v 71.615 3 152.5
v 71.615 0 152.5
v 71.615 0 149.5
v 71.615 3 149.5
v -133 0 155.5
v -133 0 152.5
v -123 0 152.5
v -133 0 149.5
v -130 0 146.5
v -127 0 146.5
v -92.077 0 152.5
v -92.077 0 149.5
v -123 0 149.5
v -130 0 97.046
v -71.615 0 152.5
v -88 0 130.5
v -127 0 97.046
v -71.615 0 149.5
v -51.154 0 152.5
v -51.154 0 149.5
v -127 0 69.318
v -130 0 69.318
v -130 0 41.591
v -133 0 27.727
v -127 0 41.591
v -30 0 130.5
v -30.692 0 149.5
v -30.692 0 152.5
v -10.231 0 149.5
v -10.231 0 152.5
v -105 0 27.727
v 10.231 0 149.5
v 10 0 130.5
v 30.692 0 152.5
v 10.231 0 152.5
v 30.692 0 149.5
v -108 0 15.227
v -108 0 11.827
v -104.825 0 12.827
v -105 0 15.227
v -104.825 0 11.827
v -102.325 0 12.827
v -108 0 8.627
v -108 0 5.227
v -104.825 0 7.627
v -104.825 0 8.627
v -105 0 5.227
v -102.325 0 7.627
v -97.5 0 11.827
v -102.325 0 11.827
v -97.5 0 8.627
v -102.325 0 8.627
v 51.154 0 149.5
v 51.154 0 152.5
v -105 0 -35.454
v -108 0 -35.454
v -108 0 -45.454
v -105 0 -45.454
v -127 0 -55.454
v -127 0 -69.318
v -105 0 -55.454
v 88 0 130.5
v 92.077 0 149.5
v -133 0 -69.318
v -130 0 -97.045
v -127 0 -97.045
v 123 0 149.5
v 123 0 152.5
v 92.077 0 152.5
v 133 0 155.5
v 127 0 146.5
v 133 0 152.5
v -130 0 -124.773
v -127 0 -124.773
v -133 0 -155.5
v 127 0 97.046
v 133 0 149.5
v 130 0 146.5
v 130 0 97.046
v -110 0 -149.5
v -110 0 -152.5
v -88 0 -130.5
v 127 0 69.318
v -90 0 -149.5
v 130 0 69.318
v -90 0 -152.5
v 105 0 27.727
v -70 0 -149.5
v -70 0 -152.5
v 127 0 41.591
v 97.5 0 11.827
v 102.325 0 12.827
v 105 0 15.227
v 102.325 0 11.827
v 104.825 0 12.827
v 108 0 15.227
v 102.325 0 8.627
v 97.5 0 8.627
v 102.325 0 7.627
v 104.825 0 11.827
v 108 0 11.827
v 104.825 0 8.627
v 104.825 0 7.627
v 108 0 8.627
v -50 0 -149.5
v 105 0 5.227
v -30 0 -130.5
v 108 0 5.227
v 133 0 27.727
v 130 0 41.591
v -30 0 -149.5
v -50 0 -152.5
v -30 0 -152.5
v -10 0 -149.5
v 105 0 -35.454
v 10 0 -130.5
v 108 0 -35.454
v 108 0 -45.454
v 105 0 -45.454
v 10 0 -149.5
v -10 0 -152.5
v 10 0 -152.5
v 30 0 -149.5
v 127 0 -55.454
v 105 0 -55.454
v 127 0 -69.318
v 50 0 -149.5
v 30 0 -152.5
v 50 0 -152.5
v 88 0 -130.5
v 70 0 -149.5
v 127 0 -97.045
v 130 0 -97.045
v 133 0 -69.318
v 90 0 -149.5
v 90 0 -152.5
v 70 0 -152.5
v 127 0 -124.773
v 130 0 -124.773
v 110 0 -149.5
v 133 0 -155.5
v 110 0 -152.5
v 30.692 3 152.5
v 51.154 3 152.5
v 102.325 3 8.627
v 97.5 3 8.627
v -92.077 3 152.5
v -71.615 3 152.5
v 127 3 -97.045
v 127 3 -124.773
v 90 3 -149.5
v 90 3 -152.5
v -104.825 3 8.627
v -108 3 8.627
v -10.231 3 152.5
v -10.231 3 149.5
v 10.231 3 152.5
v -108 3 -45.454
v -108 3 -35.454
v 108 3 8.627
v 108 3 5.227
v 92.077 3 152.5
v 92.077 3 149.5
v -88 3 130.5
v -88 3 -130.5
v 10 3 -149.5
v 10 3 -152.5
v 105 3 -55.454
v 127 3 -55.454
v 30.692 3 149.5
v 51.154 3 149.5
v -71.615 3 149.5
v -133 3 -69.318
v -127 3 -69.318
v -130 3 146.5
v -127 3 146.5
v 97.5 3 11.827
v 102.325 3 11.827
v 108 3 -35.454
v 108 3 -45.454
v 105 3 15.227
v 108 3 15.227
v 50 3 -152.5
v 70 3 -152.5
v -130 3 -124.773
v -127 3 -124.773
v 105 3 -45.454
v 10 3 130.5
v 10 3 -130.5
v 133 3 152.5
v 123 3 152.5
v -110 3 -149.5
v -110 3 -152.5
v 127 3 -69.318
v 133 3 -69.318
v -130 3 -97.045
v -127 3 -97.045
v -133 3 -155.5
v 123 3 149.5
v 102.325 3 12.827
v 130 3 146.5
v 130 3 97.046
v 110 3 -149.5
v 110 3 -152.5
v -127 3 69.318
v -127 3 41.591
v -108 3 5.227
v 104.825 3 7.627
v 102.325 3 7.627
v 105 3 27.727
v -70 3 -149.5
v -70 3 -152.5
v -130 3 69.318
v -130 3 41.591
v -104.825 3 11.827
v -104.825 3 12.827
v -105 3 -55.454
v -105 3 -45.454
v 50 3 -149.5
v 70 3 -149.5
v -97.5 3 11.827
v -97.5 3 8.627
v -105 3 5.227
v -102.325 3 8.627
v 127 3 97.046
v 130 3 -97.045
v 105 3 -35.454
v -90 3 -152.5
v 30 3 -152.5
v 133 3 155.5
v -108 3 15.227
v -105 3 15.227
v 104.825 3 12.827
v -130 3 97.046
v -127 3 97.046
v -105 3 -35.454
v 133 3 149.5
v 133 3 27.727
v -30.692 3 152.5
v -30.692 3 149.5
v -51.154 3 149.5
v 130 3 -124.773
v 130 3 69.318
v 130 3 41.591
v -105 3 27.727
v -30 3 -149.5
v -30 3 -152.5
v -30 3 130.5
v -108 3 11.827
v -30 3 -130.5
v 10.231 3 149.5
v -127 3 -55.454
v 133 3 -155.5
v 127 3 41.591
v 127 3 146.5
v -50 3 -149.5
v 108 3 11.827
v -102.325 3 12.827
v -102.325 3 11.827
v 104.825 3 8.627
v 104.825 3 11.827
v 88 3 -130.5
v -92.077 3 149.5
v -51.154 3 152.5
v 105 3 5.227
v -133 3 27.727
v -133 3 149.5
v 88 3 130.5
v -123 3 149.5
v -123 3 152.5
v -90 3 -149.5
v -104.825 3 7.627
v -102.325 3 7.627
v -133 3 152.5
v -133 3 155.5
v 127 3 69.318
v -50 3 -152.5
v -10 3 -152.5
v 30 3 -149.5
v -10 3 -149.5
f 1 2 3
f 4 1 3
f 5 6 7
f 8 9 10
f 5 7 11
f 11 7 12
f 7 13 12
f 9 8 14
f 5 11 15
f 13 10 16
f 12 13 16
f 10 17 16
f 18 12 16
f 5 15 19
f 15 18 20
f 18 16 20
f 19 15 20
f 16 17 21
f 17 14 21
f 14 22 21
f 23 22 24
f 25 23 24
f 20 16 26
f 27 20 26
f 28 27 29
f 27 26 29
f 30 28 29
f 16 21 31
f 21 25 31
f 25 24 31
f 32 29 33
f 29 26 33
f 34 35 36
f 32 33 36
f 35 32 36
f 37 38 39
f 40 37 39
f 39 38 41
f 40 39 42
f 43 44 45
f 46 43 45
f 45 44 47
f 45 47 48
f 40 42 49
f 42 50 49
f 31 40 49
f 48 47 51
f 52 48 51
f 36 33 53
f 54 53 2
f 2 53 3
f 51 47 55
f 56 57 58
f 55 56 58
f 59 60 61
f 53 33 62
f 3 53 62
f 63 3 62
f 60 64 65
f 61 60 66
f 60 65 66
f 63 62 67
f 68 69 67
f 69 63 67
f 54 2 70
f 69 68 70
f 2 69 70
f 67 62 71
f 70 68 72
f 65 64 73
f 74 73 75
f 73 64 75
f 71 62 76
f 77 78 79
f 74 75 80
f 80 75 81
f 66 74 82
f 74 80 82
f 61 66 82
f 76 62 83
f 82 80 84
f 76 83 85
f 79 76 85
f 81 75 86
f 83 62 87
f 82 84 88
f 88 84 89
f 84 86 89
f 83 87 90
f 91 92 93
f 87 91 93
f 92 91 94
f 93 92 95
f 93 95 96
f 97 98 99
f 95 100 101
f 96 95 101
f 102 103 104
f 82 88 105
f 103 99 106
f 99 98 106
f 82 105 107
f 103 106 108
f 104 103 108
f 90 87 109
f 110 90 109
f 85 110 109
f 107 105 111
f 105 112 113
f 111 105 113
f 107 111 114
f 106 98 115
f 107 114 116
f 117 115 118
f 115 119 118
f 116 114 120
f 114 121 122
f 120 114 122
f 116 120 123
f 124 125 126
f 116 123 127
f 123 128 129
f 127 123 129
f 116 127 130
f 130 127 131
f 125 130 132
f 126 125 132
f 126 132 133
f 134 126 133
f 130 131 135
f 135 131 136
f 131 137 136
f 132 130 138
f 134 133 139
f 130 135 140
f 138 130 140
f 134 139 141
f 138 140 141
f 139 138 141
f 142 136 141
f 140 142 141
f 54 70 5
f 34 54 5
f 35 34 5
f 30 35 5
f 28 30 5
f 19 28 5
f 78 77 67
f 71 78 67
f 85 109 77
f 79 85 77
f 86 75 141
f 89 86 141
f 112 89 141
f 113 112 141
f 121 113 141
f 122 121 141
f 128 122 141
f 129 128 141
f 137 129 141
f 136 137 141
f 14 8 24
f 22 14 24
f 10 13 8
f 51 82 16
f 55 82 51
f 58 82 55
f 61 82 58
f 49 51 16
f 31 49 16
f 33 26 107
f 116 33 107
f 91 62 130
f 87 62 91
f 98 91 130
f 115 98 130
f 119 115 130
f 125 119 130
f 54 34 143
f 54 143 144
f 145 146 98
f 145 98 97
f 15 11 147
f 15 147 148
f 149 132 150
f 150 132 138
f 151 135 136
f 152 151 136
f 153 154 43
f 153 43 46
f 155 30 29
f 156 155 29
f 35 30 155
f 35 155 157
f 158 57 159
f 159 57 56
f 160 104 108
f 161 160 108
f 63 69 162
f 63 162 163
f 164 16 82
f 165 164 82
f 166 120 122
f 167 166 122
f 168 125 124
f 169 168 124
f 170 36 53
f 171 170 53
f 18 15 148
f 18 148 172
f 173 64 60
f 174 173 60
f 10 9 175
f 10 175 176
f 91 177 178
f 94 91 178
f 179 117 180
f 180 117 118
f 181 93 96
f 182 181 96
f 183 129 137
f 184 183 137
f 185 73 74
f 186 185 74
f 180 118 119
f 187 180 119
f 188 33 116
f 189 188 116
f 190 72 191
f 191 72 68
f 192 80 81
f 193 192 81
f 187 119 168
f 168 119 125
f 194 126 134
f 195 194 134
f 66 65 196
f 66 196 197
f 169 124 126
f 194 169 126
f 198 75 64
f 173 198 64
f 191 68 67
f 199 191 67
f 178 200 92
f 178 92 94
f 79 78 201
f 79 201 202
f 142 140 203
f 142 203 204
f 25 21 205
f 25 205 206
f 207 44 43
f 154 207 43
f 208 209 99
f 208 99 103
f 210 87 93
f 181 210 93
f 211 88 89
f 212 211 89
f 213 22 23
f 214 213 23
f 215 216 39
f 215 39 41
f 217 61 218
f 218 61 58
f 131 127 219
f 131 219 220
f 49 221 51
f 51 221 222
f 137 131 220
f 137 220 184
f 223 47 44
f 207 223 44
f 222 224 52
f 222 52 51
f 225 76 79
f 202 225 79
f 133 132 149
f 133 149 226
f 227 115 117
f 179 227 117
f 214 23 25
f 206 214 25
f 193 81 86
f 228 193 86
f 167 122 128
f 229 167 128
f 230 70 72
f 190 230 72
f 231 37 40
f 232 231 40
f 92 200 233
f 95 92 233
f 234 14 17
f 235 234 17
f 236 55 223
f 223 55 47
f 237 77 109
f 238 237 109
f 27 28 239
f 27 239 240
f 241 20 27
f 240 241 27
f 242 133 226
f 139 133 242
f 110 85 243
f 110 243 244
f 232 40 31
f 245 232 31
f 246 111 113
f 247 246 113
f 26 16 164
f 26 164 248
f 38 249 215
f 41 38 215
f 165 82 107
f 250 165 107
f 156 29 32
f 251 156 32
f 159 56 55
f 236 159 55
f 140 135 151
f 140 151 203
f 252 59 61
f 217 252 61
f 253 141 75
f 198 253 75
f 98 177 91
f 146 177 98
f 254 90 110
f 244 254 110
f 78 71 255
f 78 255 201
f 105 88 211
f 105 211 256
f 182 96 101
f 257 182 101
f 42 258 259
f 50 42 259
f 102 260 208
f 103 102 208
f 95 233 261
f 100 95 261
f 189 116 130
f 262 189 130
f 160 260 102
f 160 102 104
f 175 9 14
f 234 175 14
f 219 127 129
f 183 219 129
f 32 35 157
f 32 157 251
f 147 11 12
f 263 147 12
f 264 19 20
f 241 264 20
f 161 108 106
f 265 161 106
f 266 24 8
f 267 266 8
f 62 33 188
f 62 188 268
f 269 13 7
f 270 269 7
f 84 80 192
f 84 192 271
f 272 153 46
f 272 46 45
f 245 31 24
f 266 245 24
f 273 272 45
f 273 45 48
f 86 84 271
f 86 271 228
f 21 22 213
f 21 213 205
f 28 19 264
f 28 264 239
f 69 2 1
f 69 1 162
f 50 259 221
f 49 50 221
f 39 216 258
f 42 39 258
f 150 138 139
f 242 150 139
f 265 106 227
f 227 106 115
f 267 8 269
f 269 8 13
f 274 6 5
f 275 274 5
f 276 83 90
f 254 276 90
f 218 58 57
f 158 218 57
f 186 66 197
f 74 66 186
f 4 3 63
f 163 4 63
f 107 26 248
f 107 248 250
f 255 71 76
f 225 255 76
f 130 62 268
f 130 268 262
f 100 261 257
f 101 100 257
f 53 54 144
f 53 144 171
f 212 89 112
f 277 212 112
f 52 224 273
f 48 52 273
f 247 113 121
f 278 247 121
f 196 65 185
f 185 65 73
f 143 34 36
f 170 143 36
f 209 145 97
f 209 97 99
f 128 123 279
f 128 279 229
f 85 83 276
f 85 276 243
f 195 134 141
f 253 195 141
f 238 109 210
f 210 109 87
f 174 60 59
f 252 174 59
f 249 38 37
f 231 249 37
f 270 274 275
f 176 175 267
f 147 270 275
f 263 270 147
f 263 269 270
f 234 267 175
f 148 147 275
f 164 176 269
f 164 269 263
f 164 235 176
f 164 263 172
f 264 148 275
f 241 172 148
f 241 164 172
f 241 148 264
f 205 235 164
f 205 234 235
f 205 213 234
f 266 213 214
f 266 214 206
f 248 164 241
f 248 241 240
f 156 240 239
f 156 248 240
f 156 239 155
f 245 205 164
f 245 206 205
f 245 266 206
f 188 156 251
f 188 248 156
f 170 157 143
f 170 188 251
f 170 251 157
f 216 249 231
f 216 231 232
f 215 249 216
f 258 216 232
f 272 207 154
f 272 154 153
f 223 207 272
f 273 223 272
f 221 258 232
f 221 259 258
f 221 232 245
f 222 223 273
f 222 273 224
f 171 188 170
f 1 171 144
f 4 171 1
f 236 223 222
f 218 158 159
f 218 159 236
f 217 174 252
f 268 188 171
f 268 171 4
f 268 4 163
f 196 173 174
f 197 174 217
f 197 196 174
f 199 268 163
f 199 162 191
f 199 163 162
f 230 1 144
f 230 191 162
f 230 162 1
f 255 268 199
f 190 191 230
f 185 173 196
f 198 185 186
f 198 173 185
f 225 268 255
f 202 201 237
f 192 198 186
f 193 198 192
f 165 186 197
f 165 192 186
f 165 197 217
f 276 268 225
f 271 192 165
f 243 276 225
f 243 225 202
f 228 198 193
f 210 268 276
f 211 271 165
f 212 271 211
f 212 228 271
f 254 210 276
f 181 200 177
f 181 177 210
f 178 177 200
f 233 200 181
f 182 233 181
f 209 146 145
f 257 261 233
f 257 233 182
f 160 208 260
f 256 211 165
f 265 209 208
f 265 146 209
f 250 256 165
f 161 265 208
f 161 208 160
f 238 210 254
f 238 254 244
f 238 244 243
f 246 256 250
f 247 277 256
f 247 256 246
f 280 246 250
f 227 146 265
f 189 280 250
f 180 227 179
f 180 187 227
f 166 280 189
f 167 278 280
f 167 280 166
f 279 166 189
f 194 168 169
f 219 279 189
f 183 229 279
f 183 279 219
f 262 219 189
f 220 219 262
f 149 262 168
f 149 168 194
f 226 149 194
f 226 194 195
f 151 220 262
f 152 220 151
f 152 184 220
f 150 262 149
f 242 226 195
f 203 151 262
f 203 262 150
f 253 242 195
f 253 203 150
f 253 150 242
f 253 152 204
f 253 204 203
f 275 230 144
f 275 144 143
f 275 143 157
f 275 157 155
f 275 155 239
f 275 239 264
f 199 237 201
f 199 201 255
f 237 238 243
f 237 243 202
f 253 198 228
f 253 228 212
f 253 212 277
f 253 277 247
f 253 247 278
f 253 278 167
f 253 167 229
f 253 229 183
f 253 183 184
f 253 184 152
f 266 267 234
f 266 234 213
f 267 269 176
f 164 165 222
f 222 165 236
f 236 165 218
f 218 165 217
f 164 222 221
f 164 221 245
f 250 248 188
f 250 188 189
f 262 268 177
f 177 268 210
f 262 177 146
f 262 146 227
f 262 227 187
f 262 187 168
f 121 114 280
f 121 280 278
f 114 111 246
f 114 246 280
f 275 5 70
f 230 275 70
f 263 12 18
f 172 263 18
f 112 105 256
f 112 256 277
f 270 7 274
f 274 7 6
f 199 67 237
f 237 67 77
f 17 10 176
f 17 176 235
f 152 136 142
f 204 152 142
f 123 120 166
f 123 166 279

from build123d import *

# Parameters (mm, degrees)
SKETCH1_W           = 3
SKETCH1_H           = 49.4545
SKETCH1_W_2         = 20.4615
SKETCH1_H_2         = 3
SKETCH1_H_3         = 27.7273
SKETCH1_W_3         = 20
SKETCH1_W_4         = 176
SKETCH1_H_4         = 261
BOSS_EXTRUDE1_DEPTH = 3
SKETCH2_W           = 10.5
SKETCH2_H           = 3.2
SKETCH2_W_2         = 2.5
SKETCH2_H_2         = 5.2
CUT_EXTRUDE1_DEPTH  = 10
SKETCH4_W           = 40
SKETCH4_H           = 261
BOSS_EXTRUDE2_DEPTH = 3


with BuildPart() as part:
    # Sketch1 → Boss-Extrude1 (new body)
    with BuildSketch(Plane(origin=(0, 0, 0), x_dir=(1, 0, 0), z_dir=(0, 1, 0))):
        Polygon((-133, -152.5), (-133, -155.5), (133, -155.5), (133, -152.5), (123, -152.5), (123, -149.5), (133, -149.5), (133, -27.7273), (105, -27.7273), (105, -15.2273), (108, -15.2273), (108, -5.2273), (105, -5.2273), (105, 35.4545), (108, 35.4545), (108, 45.4545), (105, 45.4545), (105, 55.4545), (127, 55.4545), (127, 69.3181), (133, 69.3181), (133, 155.5), (-133, 155.5), (-133, 69.3181), (-127, 69.3181), (-127, 55.4545), (-105, 55.4545), (-105, 45.4545), (-108, 45.4545), (-108, 35.4545), (-105, 35.4545), (-105, -5.2273), (-108, -5.2273), (-108, -15.2273), (-105, -15.2273), (-105, -27.7273), (-133, -27.7273), (-133, -149.5), (-123, -149.5), (-123, -152.5), align=None)
        with Locations((-128.5, -121.77275)):
            Rectangle(SKETCH1_W, SKETCH1_H, mode=Mode.SUBTRACT)
        with Locations((-81.846, -151)):
            Rectangle(SKETCH1_W_2, SKETCH1_H_2, mode=Mode.SUBTRACT)
        with Locations((-40.923, -151)):
            Rectangle(SKETCH1_W_2, SKETCH1_H_2, mode=Mode.SUBTRACT)
        with Locations((0, -151)):
            Rectangle(SKETCH1_W_2, SKETCH1_H_2, mode=Mode.SUBTRACT)
        with Locations((-128.5, -55.45455)):
            Rectangle(SKETCH1_W, SKETCH1_H_3, mode=Mode.SUBTRACT)
        with Locations((40.923, -151)):
            Rectangle(SKETCH1_W_2, SKETCH1_H_2, mode=Mode.SUBTRACT)
        with Locations((81.846, -151)):
            Rectangle(SKETCH1_W_2, SKETCH1_H_2, mode=Mode.SUBTRACT)
        with Locations((128.5, -121.77275)):
            Rectangle(SKETCH1_W, SKETCH1_H, mode=Mode.SUBTRACT)
        with Locations((128.5, -55.45455)):
            Rectangle(SKETCH1_W, SKETCH1_H_3, mode=Mode.SUBTRACT)
        with Locations((-128.5, 110.90905)):
            Rectangle(SKETCH1_W, SKETCH1_H_3, mode=Mode.SUBTRACT)
        with Locations((-100, 151)):
            Rectangle(SKETCH1_W_3, SKETCH1_H_2, mode=Mode.SUBTRACT)
        with Locations((-60, 151)):
            Rectangle(SKETCH1_W_3, SKETCH1_H_2, mode=Mode.SUBTRACT)
        with Locations((-20, 151)):
            Rectangle(SKETCH1_W_3, SKETCH1_H_2, mode=Mode.SUBTRACT)
        Rectangle(SKETCH1_W_4, SKETCH1_H_4, mode=Mode.SUBTRACT)
        with Locations((20, 151)):
            Rectangle(SKETCH1_W_3, SKETCH1_H_2, mode=Mode.SUBTRACT)
        with Locations((60, 151)):
            Rectangle(SKETCH1_W_3, SKETCH1_H_2, mode=Mode.SUBTRACT)
        with Locations((128.5, 110.90905)):
            Rectangle(SKETCH1_W, SKETCH1_H_3, mode=Mode.SUBTRACT)
        with Locations((100, 151)):
            Rectangle(SKETCH1_W_3, SKETCH1_H_2, mode=Mode.SUBTRACT)
    extrude(amount=BOSS_EXTRUDE1_DEPTH)

    # Sketch2 → Cut-Extrude1 (cut)
    with BuildSketch(Plane(origin=(0, 3, 0), x_dir=(1, 0, 0), z_dir=(0, 1, 0))):
        with Locations((-102.75, -10.2273)):
            Rectangle(SKETCH2_W, SKETCH2_H)
        with Locations((102.75, -10.2273)):
            Rectangle(SKETCH2_W, SKETCH2_H)
        with Locations((103.575, -10.2273)):
            Rectangle(SKETCH2_W_2, SKETCH2_H_2)
        with Locations((-103.575, -10.2273)):
            Rectangle(SKETCH2_W_2, SKETCH2_H_2)
    extrude(amount=-CUT_EXTRUDE1_DEPTH, mode=Mode.SUBTRACT)

    # Sketch4 → Boss-Extrude2 (add)
    with BuildSketch(Plane(origin=(0, 0, 0), x_dir=(1, 0, 0), z_dir=(0, 1, 0))):
        with Locations((-10, 0)):
            Rectangle(SKETCH4_W, SKETCH4_H)
    extrude(amount=BOSS_EXTRUDE2_DEPTH)


solid = part.part
